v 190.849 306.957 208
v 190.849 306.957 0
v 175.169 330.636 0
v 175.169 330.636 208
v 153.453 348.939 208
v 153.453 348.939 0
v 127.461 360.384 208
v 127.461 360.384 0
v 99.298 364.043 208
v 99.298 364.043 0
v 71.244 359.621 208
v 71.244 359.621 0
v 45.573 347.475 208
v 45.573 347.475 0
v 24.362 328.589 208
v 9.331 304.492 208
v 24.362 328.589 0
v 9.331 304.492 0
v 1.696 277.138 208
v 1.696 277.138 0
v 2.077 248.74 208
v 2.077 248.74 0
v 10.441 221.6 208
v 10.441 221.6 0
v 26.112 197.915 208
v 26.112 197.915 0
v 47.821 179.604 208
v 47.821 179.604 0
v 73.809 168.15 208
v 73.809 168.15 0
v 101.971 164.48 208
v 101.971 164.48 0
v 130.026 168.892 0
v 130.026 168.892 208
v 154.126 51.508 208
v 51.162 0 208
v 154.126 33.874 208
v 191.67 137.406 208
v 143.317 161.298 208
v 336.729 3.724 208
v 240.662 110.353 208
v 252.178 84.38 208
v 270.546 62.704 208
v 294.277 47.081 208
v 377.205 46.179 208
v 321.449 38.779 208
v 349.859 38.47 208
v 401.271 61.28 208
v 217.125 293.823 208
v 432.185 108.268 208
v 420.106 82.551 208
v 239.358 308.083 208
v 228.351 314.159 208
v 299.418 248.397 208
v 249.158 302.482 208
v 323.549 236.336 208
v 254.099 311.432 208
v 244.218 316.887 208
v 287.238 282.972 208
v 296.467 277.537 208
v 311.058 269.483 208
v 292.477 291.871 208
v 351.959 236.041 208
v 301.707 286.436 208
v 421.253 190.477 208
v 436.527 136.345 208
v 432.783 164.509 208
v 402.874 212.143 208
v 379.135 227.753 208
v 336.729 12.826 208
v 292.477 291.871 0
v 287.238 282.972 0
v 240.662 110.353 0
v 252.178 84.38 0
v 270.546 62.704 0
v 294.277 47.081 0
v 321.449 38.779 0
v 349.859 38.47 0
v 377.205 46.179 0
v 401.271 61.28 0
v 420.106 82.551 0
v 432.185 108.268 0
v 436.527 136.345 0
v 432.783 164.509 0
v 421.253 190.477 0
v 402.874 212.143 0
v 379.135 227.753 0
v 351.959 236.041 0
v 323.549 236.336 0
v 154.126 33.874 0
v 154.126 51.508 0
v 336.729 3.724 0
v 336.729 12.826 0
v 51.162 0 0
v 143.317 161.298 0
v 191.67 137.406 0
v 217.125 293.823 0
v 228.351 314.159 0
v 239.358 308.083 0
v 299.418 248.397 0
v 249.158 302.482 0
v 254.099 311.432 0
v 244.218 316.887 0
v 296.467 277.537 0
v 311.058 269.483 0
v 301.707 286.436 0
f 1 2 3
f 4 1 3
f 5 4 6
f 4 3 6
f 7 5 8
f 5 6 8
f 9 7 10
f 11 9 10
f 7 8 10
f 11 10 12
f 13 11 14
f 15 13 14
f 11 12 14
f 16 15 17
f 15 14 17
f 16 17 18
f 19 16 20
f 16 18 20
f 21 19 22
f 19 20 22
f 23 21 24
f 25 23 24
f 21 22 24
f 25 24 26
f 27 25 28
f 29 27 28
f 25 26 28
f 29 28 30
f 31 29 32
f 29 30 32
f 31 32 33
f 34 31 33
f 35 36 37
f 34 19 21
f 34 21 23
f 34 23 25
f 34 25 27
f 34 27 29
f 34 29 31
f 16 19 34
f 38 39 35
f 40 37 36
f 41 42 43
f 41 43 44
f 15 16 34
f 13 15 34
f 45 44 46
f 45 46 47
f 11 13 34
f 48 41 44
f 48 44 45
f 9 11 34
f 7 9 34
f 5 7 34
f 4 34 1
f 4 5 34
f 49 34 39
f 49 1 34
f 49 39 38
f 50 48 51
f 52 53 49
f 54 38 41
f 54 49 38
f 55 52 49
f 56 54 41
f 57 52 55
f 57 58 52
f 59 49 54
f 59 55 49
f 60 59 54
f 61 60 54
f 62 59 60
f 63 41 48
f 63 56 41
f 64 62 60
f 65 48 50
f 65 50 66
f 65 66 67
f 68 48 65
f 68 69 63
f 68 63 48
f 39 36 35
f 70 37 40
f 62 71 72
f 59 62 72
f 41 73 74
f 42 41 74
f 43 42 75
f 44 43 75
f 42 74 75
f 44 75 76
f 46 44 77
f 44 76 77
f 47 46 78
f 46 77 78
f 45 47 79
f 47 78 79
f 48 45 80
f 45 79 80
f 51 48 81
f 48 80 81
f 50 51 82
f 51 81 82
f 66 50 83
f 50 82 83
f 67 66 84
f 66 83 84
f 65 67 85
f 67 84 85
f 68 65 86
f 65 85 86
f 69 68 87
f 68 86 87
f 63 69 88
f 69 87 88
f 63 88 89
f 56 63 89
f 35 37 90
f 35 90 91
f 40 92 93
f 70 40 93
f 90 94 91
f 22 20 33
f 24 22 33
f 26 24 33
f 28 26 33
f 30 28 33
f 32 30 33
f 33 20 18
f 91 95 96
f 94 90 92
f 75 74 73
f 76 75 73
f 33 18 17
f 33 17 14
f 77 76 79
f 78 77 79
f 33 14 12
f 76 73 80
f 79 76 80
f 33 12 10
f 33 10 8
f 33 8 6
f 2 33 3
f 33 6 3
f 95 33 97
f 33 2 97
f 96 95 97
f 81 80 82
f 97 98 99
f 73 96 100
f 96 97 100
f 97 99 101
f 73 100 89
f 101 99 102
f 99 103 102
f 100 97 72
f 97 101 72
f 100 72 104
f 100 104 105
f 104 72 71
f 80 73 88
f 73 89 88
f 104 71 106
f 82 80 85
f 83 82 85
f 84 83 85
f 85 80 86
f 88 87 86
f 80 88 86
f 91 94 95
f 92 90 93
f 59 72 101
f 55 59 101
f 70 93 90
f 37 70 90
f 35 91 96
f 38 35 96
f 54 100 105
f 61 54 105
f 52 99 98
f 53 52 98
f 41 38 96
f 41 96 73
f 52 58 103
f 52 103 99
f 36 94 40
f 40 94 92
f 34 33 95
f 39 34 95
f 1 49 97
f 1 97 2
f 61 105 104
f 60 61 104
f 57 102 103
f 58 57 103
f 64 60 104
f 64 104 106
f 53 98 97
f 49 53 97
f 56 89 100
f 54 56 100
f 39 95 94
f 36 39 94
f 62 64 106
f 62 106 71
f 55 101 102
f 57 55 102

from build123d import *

# Parameters (mm, degrees)
SKETCH_1_R      = 99.790649717
SKETCH_1_R_2    = 99.803620069
EXTRUDE_1_DEPTH = 208


with BuildPart() as part:
    # 草图1 → 凸台-拉伸1 (new body)
    with BuildSketch(Plane.XY):
        with Locations((100.652828051, 264.261906095)):
            Circle(SKETCH_1_R)
        with BuildLine():
            Line((51.162061057, 0), (336.729475208, 3.724305137))
            Line((336.729475208, 3.724305137), (336.729475208, 12.826055388))
            Line((336.729475208, 12.826055388), (154.125610781, 33.873852846))
            Line((154.125610781, 33.873852846), (154.125610781, 51.508493959))
            Line((154.125610781, 51.508493959), (191.67033057, 137.40626196))
            Line((191.67033057, 137.40626196), (240.662425477, 110.352897381))
            ThreePointArc((240.662425477, 110.352897381), (253.352736169, 192.261361688), (323.548842254, 236.335698903))
            Line((323.548842254, 236.335698903), (299.418472532, 248.397124418))
            Line((299.418472532, 248.397124418), (311.058094029, 269.483395245))
            Line((311.058094029, 269.483395245), (296.467383181, 277.537467633))
            Line((296.467383181, 277.537467633), (301.706884634, 286.436303433))
            Line((301.706884634, 286.436303433), (292.477329355, 291.87052757))
            Line((292.477329355, 291.87052757), (287.237827902, 282.971691769))
            Line((287.237827902, 282.971691769), (249.158038274, 302.482086968))
            Line((249.158038274, 302.482086968), (254.098559787, 311.432307098))
            Line((254.098559787, 311.432307098), (244.217516762, 316.886642848))
            Line((244.217516762, 316.886642848), (239.358147451, 308.083437573))
            Line((239.358147451, 308.083437573), (228.350833321, 314.159474973))
            Line((228.350833321, 314.159474973), (217.125127284, 293.823050994))
            Line((217.125127284, 293.823050994), (190.848647814, 306.957197033))
            ThreePointArc((190.848647814, 306.957197033), (198.015226406, 286.14196911), (200.443477768, 264.261906095))
            ThreePointArc((200.443477768, 264.261906095), (180.931523877, 204.987082034), (130.025963153, 168.892137797))
            Line((130.025963153, 168.892137797), (143.317282357, 161.298356371))
            Line((143.317282357, 161.298356371), (51.162061057, 0))
        make_face()
        with Locations((336.729475208, 137.40626196)):
            Circle(SKETCH_1_R_2)
    extrude(amount=EXTRUDE_1_DEPTH)


solid = part.part
